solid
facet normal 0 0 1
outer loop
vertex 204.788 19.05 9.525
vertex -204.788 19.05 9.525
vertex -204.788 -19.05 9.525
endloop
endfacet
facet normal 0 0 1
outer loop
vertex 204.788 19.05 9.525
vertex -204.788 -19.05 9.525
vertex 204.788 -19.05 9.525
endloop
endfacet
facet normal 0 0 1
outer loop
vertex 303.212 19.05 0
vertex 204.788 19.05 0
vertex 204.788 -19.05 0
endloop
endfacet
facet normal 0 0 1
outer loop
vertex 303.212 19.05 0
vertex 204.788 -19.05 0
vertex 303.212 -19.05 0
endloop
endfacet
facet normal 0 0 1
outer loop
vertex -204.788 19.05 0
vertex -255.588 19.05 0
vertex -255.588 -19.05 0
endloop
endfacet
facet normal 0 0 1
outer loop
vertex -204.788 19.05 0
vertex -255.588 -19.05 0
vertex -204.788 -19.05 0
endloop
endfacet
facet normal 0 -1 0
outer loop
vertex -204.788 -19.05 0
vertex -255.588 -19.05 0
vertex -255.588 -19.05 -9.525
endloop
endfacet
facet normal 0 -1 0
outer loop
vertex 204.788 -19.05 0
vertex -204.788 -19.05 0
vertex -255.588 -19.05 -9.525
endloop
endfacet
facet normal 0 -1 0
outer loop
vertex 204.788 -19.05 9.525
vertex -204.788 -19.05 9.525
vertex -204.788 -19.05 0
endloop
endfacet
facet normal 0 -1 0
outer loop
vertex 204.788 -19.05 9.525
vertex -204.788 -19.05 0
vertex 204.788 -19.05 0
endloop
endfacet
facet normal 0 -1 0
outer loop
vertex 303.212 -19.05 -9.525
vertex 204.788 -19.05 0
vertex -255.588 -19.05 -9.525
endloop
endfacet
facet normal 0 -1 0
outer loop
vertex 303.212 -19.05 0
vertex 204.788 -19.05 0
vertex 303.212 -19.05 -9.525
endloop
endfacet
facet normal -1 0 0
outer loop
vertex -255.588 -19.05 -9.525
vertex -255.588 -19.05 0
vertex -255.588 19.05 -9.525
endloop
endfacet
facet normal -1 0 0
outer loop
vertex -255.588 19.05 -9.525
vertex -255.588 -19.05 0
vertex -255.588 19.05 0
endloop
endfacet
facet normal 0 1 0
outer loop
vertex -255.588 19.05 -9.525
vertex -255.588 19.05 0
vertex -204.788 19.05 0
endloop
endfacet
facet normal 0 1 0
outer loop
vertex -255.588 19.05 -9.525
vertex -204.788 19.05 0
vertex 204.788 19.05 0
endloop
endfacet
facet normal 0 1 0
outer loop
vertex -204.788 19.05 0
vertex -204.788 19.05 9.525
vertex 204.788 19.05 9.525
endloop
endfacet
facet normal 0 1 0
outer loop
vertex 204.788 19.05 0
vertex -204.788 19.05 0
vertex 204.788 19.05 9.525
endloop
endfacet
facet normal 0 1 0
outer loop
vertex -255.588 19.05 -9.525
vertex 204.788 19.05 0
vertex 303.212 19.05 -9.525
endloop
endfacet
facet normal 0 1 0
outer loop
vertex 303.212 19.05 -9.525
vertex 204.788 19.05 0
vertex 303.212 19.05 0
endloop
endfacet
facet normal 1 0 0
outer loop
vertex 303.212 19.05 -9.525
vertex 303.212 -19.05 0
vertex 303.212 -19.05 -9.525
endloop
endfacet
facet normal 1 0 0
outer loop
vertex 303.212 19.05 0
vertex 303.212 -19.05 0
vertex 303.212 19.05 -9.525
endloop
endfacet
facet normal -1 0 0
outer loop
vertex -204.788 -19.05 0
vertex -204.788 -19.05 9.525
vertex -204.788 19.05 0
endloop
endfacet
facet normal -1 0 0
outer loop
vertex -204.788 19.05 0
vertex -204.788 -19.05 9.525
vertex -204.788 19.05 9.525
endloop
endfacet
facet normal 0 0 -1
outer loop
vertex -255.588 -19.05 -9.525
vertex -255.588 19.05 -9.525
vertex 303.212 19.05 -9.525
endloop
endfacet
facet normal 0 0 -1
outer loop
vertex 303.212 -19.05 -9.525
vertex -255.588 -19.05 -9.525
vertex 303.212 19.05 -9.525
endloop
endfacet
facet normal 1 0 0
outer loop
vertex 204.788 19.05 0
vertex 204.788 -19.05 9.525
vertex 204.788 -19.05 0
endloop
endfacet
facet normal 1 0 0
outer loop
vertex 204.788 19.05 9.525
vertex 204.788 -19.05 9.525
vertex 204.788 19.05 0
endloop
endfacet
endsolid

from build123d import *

# Parameters (mm, degrees)
F0_W     = 409.575
F0_H     = 38.1
F1_DEPTH = 9.525
F2_W     = 50.8
F2_H     = 38.1
F2_W_2   = 98.425
F3_DEPTH = 9.525


with BuildPart() as f1:
    # F0 (on Top) → F1 (new body, symmetric)
    with BuildSketch(Plane.XY):
        Rectangle(F0_W, F0_H)
    extrude(amount=F1_DEPTH, both=True)

    # F2 (on Top) → F3 (join, through all)
    with BuildSketch(Plane.XY):
        with Locations((-230.1875, 0)):
            Rectangle(F2_W, F2_H)
        with Locations((254, 0)):
            Rectangle(F2_W_2, F2_H)
    extrude(amount=-F3_DEPTH)


solid = f1.part
